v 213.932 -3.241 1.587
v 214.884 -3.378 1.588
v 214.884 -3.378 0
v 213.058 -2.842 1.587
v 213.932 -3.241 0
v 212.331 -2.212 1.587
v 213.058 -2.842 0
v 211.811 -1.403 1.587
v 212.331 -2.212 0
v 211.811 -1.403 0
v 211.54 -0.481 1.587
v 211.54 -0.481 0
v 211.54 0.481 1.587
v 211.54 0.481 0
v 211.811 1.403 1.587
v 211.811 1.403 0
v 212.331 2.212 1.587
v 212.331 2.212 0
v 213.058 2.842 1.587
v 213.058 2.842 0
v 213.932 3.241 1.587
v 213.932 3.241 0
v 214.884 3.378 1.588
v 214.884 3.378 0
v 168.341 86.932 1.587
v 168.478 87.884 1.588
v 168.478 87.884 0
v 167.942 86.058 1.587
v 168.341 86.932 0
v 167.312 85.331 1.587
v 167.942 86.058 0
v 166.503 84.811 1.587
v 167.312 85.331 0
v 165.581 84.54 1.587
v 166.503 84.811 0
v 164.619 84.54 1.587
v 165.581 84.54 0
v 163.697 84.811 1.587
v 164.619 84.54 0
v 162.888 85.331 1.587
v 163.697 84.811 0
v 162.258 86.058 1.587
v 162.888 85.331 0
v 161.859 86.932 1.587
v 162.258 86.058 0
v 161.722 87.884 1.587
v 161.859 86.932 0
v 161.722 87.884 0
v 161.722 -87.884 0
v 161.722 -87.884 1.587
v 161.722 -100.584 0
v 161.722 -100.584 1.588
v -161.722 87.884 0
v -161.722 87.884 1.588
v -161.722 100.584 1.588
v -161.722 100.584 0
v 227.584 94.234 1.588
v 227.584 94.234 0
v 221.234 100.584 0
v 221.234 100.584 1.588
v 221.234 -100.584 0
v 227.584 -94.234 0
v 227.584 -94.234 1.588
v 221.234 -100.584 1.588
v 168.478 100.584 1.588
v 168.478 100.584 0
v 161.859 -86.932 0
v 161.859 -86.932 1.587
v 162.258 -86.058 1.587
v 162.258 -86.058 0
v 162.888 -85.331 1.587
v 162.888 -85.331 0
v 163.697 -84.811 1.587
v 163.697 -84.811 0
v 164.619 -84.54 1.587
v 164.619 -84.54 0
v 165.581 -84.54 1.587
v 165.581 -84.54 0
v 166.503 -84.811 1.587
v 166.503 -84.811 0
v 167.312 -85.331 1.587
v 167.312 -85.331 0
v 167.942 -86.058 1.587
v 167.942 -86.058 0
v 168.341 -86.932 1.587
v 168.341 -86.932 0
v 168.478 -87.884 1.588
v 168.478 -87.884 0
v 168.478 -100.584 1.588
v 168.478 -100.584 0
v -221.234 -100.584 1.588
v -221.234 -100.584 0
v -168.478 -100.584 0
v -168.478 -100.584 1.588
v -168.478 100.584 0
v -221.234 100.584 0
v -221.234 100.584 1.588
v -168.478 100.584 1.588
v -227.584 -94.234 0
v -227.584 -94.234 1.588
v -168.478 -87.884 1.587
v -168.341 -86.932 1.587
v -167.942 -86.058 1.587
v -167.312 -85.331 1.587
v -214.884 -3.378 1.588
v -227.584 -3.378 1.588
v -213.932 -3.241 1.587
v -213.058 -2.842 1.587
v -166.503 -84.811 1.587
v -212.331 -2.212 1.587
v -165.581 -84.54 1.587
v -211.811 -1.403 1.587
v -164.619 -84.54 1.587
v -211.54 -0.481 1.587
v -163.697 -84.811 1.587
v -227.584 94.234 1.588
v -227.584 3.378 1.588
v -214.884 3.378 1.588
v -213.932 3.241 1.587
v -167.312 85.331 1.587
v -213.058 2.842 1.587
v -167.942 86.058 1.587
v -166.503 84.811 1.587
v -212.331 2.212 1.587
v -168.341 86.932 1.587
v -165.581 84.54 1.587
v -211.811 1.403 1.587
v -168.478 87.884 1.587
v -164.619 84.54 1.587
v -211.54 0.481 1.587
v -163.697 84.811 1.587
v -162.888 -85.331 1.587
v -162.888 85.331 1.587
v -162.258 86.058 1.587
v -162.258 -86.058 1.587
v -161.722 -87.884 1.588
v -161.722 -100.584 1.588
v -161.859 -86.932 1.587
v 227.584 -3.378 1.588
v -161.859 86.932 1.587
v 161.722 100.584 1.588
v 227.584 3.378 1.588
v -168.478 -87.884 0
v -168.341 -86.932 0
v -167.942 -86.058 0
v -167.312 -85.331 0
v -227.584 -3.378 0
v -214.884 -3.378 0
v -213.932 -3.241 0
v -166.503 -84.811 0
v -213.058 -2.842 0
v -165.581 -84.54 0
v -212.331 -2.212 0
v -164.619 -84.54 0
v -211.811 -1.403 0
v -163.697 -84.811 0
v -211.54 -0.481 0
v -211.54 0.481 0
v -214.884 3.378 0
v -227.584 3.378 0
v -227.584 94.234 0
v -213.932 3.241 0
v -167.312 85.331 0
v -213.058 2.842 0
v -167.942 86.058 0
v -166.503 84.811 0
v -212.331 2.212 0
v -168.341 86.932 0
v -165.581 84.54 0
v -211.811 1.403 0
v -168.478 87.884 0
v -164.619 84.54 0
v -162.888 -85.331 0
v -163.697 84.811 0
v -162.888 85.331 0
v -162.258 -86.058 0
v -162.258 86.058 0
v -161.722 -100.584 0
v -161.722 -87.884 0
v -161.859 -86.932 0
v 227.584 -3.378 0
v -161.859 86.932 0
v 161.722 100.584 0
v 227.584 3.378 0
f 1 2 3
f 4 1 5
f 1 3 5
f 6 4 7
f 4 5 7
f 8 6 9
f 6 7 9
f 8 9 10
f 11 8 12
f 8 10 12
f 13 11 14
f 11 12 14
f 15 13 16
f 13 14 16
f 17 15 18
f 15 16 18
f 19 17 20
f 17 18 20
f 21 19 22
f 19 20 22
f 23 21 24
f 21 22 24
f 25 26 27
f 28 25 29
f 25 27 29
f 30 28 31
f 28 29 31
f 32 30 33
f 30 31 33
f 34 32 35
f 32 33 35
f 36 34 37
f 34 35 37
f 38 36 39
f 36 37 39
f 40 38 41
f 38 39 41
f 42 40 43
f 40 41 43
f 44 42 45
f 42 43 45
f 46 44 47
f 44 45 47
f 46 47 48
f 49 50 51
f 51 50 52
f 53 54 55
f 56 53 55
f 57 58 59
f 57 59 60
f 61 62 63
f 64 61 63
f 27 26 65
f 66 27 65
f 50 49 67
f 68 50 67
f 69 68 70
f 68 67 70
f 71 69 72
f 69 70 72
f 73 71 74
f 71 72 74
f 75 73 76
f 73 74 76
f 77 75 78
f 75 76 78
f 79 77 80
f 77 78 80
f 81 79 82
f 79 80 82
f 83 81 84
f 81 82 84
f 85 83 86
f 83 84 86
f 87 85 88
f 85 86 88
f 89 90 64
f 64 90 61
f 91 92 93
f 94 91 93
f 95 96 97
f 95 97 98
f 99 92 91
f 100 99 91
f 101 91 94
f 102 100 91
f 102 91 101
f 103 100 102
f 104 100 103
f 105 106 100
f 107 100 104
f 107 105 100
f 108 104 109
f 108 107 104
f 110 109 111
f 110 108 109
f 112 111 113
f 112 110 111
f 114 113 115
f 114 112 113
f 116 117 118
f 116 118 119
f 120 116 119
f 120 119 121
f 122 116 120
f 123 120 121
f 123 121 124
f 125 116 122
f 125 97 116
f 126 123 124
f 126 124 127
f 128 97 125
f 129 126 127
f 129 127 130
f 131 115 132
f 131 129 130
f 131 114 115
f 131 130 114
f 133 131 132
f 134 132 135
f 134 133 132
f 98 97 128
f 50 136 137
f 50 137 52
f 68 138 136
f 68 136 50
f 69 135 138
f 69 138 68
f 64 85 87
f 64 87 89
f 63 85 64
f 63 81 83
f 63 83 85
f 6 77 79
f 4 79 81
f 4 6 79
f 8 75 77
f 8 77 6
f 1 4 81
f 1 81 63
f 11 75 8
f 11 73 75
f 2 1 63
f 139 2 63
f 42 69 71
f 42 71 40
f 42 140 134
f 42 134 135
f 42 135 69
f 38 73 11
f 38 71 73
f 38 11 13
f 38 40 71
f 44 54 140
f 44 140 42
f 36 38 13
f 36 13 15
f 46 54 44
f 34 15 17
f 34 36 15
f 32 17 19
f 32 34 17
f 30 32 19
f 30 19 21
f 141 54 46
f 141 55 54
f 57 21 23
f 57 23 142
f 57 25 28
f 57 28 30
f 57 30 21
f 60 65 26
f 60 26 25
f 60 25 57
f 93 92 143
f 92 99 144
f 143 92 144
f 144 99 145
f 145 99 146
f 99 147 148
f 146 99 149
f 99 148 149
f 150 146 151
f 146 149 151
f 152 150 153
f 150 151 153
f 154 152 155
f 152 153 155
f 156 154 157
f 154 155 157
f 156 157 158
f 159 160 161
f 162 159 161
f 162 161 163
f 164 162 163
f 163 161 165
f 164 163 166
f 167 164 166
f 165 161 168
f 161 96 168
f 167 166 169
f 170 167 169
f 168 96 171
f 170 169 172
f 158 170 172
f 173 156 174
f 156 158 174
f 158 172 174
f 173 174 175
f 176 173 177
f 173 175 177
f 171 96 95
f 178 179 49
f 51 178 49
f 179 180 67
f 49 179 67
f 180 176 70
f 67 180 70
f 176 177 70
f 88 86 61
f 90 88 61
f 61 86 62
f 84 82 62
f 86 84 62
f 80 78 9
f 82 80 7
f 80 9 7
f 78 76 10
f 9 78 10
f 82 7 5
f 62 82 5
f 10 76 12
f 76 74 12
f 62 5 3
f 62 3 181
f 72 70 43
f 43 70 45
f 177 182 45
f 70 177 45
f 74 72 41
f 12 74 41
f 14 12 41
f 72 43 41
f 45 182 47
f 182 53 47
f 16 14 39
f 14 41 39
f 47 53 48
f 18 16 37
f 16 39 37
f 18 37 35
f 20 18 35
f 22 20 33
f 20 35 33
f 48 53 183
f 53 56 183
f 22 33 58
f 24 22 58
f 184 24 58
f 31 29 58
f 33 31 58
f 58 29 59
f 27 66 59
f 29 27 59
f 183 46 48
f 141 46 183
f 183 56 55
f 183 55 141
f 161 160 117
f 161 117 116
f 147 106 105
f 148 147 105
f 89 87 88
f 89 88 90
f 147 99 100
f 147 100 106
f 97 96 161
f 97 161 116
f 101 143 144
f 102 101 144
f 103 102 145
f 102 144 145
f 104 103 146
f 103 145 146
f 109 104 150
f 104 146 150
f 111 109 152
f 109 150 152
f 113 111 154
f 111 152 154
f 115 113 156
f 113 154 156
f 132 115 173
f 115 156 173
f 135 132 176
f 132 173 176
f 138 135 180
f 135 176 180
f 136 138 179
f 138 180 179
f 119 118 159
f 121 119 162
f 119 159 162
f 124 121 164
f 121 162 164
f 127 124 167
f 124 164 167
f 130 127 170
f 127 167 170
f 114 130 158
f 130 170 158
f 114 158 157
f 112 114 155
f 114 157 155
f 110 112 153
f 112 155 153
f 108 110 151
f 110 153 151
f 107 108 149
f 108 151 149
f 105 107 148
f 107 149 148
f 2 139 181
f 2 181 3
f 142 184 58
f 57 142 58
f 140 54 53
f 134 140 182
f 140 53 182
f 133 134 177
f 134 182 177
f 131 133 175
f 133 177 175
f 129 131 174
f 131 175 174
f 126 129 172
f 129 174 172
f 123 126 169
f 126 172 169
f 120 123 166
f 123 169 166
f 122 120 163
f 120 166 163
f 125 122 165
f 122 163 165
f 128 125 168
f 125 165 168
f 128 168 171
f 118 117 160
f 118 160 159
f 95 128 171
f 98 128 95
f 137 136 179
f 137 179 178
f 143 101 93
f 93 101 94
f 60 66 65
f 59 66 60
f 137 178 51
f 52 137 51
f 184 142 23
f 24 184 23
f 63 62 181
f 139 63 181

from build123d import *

# Parameters (mm, degrees)
SKETCH1_W               = 455.168
SKETCH1_H               = 201.168
BOSS_EXTRUDE1_DEPTH     = 1.5875
F_1_4_CLEARANCE_HOLE1_D = 6.7564
CHAMFER1_SIZE           = 6.35
CUT_EXTRUDE1_REACH      = 250.826
SKETCH4_W               = 6.7564
SKETCH4_H               = 14.488627811
CUT_EXTRUDE2_REACH      = 250.826
SKETCH5_W               = 19.05
SKETCH5_H               = 6.7564


with BuildPart() as part:
    # Sketch1 → Boss-Extrude1 (new body)
    with BuildSketch(Plane.XY):
        Rectangle(SKETCH1_W, SKETCH1_H)
    extrude(amount=BOSS_EXTRUDE1_DEPTH)

    # 1/4 Clearance Hole1 (through all)
    with Locations(Plane.XY.offset(1.5875)):
        with Locations((-165.1, 87.884), (165.1, 87.884), (214.884, 0), (-214.884, 0), (-165.1, -87.884), (165.1, -87.884)):
            Hole(F_1_4_CLEARANCE_HOLE1_D / 2)

    # Chamfer1
    chamfer1_edges = [part.edges().sort_by_distance(p)[0] for p in [
        (227.584, -100.584, 0.79375),
        (-227.584, -100.584, 0.79375),
        (-227.584, 100.584, 0.79375),
        (227.584, 100.584, 0.79375),
    ]]
    chamfer(chamfer1_edges, length=CHAMFER1_SIZE)

    # Sketch4 → Cut-Extrude1 (cut, up to next)
    with BuildSketch(Plane.XY.offset(1.5875), mode=Mode.PRIVATE) as cut_extrude1_sk1:
        with Locations((-165.1, 95.128313905)):
            Rectangle(SKETCH4_W, SKETCH4_H)
    cut_extrude1_tool1 = extrude(cut_extrude1_sk1.sketch, amount=-CUT_EXTRUDE1_REACH, mode=Mode.PRIVATE) & part.part
    # Sketch4 → Cut-Extrude1 (cut, up to next)
    with BuildSketch(Plane.XY.offset(1.5875), mode=Mode.PRIVATE) as cut_extrude1_sk2:
        with Locations((165.1, 95.128313905)):
            Rectangle(SKETCH4_W, SKETCH4_H)
    cut_extrude1_tool2 = extrude(cut_extrude1_sk2.sketch, amount=-CUT_EXTRUDE1_REACH, mode=Mode.PRIVATE) & part.part
    cut_extrude1_1 = cut_extrude1_tool1.solids().sort_by_distance((-165.1, 95.128314, 1.5875))[0]
    add(cut_extrude1_1, mode=Mode.SUBTRACT)
    cut_extrude1_2 = cut_extrude1_tool2.solids().sort_by_distance((165.1, 95.128314, 1.5875))[0]
    add(cut_extrude1_2, mode=Mode.SUBTRACT)
    cut_extrude1 = cut_extrude1_1 + cut_extrude1_2  # Cut-Extrude1 as one shape, for the pattern or mirror that repeats it

    # Mirror5: Cut-Extrude1 across plane
    add(cut_extrude1.mirror(Plane.ZX), mode=Mode.SUBTRACT)

    # Sketch5 → Cut-Extrude2 (cut, up to next)
    with BuildSketch(Plane.XY.offset(1.5875), mode=Mode.PRIVATE) as cut_extrude2_sk1:
        with Locations((-224.409, 0)):
            Rectangle(SKETCH5_W, SKETCH5_H)
    cut_extrude2_tool1 = extrude(cut_extrude2_sk1.sketch, amount=-CUT_EXTRUDE2_REACH, mode=Mode.PRIVATE) & part.part
    cut_extrude2 = cut_extrude2_tool1.solids().sort_by_distance((-224.409, 0, 1.5875))[0]
    add(cut_extrude2, mode=Mode.SUBTRACT)

    # Mirror6: Cut-Extrude2 across plane
    add(cut_extrude2.mirror(Plane(origin=(0, 0, 0), x_dir=(0, 0, 1), z_dir=(1, 0, 0))), mode=Mode.SUBTRACT)


solid = part.part
